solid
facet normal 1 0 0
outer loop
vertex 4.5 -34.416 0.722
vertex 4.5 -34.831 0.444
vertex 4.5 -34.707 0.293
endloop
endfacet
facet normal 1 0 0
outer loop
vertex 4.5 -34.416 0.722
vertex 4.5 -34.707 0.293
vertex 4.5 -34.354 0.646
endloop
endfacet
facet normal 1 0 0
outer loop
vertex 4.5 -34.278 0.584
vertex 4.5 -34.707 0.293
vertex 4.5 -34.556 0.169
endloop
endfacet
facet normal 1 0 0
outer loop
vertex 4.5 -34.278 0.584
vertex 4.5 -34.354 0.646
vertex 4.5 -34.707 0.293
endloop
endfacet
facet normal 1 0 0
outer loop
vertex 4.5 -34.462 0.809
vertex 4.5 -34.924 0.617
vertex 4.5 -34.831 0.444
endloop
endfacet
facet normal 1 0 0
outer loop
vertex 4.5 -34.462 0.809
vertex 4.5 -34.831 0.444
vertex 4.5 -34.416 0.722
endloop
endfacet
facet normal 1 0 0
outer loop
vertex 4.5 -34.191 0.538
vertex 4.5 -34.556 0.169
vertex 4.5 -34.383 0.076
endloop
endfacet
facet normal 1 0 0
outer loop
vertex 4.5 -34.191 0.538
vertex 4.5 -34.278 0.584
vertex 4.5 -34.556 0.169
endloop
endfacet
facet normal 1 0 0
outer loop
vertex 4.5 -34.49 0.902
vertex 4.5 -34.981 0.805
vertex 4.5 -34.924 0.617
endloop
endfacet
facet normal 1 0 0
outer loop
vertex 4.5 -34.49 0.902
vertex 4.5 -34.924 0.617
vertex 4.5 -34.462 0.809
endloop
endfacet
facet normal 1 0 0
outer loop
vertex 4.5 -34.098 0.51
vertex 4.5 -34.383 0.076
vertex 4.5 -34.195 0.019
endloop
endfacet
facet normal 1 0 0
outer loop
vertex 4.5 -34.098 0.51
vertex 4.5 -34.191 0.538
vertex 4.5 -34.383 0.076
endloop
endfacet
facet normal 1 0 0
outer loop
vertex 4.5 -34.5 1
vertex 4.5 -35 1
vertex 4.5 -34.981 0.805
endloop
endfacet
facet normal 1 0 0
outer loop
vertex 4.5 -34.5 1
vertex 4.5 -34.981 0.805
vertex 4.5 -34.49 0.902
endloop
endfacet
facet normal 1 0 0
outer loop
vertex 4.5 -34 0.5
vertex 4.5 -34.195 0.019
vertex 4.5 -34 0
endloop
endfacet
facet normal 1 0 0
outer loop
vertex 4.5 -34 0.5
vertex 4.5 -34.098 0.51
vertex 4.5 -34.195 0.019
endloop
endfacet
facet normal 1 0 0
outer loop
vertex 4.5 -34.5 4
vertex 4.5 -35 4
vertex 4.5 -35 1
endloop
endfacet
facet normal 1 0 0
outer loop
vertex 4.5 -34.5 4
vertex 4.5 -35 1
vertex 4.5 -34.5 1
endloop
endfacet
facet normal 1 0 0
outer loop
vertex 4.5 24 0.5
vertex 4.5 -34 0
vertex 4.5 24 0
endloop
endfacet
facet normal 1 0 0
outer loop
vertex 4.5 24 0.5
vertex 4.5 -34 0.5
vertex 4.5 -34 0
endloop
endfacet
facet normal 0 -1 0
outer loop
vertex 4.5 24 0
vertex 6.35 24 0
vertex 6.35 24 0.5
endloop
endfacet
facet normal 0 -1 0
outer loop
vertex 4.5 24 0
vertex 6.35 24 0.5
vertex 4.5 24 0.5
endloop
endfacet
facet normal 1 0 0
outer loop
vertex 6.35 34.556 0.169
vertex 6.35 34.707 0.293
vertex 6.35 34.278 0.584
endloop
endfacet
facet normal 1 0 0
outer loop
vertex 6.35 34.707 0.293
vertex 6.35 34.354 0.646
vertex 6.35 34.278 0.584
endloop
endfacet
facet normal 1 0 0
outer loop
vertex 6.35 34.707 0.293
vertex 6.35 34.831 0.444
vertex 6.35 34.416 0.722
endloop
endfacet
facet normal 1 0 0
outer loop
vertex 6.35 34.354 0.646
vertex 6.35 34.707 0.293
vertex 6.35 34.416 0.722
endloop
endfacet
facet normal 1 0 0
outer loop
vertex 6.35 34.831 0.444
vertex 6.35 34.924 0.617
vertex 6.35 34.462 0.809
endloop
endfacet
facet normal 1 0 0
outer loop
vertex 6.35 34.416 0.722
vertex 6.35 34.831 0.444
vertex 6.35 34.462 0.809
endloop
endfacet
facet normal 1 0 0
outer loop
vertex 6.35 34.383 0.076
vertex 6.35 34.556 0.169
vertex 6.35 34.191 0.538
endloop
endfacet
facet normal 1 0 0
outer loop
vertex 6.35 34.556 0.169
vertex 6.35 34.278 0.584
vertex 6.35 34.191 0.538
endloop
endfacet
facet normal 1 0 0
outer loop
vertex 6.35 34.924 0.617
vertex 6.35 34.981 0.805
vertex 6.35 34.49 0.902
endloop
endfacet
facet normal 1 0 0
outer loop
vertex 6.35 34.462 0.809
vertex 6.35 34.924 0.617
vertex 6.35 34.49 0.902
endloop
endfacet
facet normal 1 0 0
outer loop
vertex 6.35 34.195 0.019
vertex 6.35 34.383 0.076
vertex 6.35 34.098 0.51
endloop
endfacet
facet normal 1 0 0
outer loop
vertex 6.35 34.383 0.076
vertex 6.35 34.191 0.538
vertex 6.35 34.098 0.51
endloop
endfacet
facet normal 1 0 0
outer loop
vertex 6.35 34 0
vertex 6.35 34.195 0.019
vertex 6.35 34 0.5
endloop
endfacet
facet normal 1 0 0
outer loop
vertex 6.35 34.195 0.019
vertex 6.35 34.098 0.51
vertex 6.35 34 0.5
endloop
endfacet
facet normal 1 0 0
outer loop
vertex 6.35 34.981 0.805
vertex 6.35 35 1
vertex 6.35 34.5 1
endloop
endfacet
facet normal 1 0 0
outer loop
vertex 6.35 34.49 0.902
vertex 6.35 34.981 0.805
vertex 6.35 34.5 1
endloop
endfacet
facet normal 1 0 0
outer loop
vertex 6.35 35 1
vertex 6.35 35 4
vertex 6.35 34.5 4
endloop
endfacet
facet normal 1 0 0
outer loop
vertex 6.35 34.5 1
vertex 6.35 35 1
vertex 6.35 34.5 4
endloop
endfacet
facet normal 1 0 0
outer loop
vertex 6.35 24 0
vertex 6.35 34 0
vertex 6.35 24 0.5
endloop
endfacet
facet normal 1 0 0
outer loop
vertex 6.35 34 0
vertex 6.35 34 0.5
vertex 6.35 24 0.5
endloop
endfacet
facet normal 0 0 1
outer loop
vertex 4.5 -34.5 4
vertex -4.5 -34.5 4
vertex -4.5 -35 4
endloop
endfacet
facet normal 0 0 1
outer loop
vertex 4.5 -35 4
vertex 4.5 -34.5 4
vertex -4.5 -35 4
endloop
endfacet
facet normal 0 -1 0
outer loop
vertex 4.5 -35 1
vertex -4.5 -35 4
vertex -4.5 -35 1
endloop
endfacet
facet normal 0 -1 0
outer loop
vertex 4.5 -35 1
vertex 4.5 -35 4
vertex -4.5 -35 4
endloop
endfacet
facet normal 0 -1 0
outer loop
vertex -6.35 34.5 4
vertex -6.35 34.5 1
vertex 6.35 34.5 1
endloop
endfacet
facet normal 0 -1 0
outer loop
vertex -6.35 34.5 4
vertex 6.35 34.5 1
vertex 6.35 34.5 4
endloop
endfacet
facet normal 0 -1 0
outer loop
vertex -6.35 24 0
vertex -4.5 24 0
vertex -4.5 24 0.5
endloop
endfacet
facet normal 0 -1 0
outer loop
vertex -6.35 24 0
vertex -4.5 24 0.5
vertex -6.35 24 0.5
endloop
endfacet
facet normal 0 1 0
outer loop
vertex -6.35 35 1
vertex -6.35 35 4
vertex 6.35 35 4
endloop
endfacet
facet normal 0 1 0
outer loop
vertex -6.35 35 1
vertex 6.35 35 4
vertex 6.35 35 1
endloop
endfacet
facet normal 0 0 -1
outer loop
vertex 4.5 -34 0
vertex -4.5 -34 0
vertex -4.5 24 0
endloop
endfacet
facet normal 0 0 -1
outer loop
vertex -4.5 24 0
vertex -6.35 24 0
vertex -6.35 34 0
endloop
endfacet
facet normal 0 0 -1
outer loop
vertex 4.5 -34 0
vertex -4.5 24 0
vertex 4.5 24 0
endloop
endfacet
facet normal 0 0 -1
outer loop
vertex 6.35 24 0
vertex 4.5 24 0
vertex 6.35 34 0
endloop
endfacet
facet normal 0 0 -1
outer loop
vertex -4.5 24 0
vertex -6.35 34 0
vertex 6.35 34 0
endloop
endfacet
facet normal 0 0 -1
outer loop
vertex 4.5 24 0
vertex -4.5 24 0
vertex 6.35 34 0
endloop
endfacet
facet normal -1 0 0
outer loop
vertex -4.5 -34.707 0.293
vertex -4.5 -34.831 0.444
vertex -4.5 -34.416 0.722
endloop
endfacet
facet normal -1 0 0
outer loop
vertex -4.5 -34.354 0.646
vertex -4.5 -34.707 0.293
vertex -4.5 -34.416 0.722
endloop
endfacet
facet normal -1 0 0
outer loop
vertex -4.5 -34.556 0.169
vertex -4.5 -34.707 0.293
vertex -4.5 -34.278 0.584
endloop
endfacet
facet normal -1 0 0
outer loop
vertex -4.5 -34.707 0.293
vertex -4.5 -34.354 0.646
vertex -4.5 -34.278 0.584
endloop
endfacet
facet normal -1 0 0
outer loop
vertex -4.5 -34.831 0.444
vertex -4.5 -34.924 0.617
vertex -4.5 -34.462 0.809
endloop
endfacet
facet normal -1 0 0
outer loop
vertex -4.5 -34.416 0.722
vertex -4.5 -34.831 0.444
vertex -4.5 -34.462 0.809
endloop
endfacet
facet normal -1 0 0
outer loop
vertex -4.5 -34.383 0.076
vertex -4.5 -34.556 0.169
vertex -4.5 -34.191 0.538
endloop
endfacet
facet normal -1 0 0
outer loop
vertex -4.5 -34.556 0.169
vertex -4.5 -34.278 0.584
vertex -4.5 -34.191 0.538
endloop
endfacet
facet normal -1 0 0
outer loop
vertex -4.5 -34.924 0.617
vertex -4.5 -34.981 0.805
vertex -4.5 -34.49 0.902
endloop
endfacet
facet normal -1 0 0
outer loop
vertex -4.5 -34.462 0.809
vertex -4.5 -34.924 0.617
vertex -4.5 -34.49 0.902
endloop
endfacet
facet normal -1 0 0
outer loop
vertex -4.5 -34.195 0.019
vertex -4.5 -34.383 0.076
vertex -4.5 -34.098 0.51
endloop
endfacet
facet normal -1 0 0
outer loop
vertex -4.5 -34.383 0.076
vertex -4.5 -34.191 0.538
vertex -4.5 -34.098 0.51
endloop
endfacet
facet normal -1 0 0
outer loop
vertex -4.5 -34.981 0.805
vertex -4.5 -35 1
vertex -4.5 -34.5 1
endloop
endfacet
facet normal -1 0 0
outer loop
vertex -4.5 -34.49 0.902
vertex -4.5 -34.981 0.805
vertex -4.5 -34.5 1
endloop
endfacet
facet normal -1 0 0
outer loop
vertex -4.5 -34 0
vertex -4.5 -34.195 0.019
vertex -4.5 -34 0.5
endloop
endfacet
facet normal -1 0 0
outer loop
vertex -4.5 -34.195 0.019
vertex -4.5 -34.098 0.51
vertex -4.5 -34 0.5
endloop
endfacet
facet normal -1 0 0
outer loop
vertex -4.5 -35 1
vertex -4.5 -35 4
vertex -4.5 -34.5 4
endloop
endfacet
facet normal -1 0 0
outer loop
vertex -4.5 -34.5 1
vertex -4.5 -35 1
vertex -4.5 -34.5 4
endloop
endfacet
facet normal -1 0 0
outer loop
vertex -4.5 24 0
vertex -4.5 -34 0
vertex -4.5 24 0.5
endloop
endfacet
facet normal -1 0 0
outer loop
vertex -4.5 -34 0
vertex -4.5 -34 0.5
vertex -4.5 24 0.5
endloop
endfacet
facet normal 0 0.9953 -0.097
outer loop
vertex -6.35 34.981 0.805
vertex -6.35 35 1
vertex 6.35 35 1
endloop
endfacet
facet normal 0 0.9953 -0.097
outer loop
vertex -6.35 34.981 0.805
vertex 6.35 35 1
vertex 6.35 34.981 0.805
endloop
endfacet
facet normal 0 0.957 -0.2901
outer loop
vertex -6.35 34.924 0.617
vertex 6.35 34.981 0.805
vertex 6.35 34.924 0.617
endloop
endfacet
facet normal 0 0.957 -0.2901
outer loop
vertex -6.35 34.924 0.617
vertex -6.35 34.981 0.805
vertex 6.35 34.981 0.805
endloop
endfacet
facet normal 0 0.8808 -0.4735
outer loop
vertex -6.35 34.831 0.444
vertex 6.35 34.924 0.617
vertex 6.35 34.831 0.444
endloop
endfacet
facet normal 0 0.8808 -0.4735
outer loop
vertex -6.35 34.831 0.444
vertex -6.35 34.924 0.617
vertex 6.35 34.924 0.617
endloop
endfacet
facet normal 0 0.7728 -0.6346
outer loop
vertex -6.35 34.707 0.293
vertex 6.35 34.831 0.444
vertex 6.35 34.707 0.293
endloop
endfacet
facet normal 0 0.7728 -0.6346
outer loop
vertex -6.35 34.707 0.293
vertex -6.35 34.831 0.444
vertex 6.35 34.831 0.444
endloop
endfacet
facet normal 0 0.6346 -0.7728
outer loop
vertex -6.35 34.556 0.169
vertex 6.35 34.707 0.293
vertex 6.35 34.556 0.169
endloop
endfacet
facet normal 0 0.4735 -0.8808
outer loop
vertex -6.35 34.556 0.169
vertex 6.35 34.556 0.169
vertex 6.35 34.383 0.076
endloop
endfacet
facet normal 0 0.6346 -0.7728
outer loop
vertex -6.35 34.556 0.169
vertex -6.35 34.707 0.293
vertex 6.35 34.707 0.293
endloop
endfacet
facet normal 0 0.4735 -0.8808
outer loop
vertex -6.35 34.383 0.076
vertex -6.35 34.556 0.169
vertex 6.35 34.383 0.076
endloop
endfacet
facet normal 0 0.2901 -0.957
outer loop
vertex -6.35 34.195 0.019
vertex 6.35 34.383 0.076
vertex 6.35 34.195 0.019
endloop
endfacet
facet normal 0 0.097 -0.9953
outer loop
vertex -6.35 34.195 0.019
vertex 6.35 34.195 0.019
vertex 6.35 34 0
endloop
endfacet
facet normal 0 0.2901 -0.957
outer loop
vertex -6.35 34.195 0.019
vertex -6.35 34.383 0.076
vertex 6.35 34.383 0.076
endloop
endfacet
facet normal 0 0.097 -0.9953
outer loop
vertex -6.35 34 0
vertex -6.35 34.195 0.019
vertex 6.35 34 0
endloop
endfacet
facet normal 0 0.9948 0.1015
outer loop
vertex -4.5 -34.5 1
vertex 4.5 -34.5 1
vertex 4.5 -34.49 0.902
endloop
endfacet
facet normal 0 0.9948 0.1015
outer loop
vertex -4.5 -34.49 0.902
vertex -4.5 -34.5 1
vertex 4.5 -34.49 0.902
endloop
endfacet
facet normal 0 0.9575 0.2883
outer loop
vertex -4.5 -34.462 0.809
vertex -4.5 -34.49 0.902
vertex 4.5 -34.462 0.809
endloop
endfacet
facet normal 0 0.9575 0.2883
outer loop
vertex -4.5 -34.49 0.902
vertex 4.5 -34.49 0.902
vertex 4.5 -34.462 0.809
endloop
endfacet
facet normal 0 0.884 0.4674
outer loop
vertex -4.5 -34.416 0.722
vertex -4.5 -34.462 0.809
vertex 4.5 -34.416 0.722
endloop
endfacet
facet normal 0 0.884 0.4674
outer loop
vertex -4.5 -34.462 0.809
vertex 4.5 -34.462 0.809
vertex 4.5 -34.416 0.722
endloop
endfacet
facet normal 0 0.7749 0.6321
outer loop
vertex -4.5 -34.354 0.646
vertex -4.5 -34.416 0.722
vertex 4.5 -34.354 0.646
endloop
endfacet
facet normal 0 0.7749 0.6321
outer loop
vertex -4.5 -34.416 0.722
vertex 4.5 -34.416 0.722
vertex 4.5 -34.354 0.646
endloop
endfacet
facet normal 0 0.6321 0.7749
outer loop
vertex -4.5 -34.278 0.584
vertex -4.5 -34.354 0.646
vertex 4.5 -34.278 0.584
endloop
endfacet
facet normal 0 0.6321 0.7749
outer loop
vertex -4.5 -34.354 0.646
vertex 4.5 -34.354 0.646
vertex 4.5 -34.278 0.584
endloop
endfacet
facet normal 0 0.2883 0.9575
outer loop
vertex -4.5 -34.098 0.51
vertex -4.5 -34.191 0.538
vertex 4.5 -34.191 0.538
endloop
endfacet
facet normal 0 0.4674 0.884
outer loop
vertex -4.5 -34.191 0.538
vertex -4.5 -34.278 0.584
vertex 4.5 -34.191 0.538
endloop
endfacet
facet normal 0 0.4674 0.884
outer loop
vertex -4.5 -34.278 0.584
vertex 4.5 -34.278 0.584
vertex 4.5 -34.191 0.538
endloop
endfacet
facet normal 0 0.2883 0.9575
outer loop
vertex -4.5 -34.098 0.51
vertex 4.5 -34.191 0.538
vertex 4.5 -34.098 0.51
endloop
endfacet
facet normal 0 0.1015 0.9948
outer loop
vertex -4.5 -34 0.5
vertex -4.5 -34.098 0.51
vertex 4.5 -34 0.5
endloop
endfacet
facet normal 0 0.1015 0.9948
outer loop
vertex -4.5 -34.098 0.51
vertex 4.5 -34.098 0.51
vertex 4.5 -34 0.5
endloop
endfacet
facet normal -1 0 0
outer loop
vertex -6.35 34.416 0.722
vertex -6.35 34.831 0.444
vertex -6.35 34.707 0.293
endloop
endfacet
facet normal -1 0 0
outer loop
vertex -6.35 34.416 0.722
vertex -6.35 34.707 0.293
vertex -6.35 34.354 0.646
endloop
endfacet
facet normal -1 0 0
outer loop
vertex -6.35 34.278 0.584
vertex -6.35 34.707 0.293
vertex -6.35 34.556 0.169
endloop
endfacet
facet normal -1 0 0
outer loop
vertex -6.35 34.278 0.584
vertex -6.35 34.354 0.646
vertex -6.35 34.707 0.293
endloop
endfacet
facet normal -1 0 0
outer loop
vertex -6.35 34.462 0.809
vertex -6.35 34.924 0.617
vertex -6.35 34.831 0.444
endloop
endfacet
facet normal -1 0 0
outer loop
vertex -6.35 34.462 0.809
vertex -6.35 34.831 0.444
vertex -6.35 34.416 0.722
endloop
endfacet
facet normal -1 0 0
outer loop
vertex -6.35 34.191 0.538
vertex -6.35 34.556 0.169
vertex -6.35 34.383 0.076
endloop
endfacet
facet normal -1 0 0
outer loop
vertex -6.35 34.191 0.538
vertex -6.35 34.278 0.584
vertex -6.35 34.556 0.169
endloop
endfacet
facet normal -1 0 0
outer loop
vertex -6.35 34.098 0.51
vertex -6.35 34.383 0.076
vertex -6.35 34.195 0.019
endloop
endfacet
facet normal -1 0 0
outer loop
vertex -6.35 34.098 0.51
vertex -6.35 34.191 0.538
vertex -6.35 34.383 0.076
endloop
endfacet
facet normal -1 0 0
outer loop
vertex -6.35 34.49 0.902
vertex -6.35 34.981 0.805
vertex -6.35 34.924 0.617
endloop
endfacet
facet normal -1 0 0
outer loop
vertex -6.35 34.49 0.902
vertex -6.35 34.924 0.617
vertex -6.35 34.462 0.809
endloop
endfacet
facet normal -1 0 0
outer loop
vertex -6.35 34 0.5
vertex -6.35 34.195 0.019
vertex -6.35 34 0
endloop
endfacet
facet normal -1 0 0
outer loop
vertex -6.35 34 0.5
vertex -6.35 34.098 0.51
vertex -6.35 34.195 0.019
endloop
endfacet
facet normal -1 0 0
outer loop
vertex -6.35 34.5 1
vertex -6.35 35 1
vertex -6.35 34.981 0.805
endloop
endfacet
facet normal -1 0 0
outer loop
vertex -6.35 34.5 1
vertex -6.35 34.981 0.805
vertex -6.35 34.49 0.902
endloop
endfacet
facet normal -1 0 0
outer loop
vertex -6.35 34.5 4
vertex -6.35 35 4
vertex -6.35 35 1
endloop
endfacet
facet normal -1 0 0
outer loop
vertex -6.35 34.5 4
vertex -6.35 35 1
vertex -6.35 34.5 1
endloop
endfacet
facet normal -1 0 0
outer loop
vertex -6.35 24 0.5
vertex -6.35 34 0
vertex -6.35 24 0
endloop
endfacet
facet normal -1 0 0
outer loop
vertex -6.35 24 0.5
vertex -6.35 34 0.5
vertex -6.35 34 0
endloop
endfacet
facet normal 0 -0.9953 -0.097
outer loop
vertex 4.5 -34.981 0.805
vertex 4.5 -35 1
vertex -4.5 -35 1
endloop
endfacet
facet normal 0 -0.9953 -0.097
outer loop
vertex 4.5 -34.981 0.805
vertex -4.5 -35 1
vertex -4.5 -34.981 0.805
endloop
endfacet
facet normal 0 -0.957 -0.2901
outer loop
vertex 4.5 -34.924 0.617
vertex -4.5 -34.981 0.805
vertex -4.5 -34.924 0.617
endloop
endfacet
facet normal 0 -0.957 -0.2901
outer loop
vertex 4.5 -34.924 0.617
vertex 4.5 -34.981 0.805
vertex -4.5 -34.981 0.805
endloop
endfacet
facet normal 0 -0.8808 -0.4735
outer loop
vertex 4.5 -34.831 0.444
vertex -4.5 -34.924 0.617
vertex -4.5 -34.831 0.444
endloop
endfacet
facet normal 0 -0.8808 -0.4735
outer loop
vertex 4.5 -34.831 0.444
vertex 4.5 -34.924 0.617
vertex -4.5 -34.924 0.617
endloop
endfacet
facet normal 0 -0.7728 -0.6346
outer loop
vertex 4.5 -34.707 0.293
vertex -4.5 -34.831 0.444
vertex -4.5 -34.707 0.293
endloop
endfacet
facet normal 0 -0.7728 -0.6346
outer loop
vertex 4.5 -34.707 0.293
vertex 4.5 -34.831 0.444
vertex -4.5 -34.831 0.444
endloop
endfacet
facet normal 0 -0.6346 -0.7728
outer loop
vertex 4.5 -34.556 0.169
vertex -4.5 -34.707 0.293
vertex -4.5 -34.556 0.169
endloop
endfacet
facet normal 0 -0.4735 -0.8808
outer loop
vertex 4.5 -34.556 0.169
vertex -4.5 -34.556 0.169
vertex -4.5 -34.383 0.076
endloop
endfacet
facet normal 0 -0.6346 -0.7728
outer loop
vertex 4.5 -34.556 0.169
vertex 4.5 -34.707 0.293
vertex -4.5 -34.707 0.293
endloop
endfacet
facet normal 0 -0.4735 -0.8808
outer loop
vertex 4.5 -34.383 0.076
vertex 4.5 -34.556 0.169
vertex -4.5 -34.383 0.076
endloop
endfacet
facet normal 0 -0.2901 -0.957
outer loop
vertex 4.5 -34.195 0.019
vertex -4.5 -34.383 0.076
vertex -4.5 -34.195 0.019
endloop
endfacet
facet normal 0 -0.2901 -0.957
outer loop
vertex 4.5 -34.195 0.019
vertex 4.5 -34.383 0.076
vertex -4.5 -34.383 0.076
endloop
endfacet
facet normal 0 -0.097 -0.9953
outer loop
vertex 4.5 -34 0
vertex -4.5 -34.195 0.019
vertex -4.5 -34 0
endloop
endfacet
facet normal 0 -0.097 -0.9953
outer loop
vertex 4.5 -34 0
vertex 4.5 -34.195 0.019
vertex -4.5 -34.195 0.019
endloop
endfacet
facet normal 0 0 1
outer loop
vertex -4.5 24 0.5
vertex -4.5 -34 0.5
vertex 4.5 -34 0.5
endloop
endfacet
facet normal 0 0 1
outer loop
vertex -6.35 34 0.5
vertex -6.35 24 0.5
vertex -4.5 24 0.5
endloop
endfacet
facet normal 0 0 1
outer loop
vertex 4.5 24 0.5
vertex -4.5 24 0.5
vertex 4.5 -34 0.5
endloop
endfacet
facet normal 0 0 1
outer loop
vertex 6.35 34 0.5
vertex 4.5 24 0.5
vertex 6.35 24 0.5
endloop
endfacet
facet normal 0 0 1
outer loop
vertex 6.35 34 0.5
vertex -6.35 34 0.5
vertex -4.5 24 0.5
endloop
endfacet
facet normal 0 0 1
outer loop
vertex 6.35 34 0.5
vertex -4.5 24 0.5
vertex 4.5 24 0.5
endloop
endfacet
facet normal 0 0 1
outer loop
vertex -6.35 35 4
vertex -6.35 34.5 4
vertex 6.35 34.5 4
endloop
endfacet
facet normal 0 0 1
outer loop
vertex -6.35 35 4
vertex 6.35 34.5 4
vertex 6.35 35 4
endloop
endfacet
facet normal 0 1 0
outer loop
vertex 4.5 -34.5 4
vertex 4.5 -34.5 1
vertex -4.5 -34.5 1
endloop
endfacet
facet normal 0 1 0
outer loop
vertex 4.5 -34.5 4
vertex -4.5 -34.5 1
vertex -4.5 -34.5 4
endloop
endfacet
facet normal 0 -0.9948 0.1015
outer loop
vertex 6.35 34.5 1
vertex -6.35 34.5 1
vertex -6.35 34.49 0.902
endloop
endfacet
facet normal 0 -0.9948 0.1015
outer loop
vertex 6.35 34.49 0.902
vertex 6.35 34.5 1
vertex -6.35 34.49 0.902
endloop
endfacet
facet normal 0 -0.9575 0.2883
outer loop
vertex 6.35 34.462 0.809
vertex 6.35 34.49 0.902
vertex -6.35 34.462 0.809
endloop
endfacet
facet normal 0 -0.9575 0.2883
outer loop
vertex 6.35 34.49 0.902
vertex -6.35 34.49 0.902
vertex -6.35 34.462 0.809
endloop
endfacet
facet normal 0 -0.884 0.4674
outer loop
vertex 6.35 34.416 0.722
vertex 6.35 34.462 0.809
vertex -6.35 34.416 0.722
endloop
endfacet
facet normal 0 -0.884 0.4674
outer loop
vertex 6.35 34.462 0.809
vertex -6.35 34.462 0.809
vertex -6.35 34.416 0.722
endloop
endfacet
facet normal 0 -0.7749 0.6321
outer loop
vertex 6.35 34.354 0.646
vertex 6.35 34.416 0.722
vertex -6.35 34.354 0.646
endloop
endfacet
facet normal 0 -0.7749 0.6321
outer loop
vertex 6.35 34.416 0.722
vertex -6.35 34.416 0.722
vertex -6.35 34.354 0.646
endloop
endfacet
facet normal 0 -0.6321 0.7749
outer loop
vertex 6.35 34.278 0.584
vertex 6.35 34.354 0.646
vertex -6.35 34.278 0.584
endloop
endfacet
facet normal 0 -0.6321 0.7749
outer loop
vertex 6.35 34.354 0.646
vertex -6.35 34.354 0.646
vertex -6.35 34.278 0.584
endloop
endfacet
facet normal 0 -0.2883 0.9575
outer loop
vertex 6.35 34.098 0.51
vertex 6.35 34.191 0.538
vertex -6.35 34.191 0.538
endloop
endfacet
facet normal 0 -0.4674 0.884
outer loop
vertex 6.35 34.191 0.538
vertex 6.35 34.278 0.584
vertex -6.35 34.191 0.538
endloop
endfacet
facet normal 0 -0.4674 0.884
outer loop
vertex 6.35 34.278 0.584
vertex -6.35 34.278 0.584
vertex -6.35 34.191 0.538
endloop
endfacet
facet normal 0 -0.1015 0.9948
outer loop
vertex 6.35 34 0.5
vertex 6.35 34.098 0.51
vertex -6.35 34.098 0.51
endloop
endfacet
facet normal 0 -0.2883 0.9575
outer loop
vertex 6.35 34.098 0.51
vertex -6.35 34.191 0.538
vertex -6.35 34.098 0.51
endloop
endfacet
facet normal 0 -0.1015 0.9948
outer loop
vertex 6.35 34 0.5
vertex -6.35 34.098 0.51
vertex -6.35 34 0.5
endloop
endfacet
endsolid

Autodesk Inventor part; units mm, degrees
ref_plane "YZ Plane" through (0, 0, 0) normal (1, 0, 0) x (0, 1, 0)
ref_plane "XZ Plane" through (0, 0, 0) normal (0, 1, 0) x (-1, 0, 0)
ref_plane "XY Plane" through (0, 0, 0) normal (0, 0, 1) x (1, 0, 0)
sketch "Sketch1" plane through (0, 0, 0) normal (0, 0, 1) x (1, 0, 0)
  line L0 (0, 0) -> (6.3089, 0)
  line L1 (0, 0) -> (0, 8.1845)
  line L2 (4.5, 24) -> (4.5, -35)
  line L3 (4.5, -35) -> (-4.5, -35)
  line L4 (-4.5, -35) -> (-4.5, 24)
  line L5 (-6.35, 35) -> (6.35, 35)
  line L6 (6.35, 35) -> (6.35, 24)
  line L7 (-6.35, 24) -> (-6.35, 35)
  line L8 (6.35, 24) -> (4.5, 24)
  line L9 (-4.5, 24) -> (-6.35, 24)
  dimension "d4" = 9
  dimension "d5" = 12.7
  dimension "d6" = 70
  dimension "d7" = 11
extrude "Extrusion1" add sketch "Sketch1" along normal blind 0.5
sketch "Sketch2" plane through (-6.35, 34.5, 0) normal (0, 1, 0) x (-1, 0, 0)
  line L0 (-12.7, 0) -> (0, 0)
  line L1 (0, 0) -> (0, 4)
  line L2 (0, 4) -> (-12.7, 4)
  line L3 (-12.7, 4) -> (-12.7, 0)
edge flange "Flange1" height 4 angle 90 thickness 0.5 bend radius 0.5 thickness toward (0, 1, 0) relief straight relief width 0.5 relief depth 0.25 edges at (0, 35, 0.5) wall of the first edge with corners at (6.35, 34.5, 0) (-6.35, 34.5, 0) (-6.35, 34.5, 4) (6.35, 34.5, 4)
bend "Bend1"
corner "Corner1"
sketch "Sketch4" plane through (4.5, -34.5, 0) normal (0, -1, 0) x (1, 0, 0)
  line L0 (-9, 0) -> (0, 0)
  line L1 (0, 0) -> (0, 4)
  line L2 (0, 4) -> (-9, 4)
  line L3 (-9, 4) -> (-9, 0)
edge flange "Flange3" height 4 angle 90 thickness 0.5 bend radius 0.5 thickness toward (0, -1, 0) relief straight relief width 0.5 relief depth 0.25 edges at (0, -35, 0.5) wall of the first edge with corners at (-4.5, -34.5, 0) (4.5, -34.5, 0) (4.5, -34.5, 4) (-4.5, -34.5, 4)
bend "Bend3"
corner "Corner3"
equation "\"d8\" = BendReliefWidth"
equation "\"d9\" = BendReliefDepth"
equation "\"d10\" = MinimumRemnant"
equation "\"d11\" = BendRadius"
equation "\"d14\" = BendRadius"
equation "\"d15\" = CornerReliefSize"
equation "\"d16\" = GapSize"
equation "\"d17\" = JacobiRadiusSize"
equation "\"d28\" = BendReliefWidth"
equation "\"d29\" = BendReliefDepth"
equation "\"d30\" = MinimumRemnant"
equation "\"d31\" = BendRadius"
equation "\"d34\" = BendRadius"
equation "\"d35\" = CornerReliefSize"
equation "\"d36\" = GapSize"
equation "\"d37\" = JacobiRadiusSize"
equation "\"BendRadius\" = Thickness"
equation "\"BendReliefWidth\" = Thickness"
equation "\"BendReliefDepth\" = 0.5 * Thickness"
equation "\"CornerReliefSize\" = 4 * Thickness"
equation "\"MinimumRemnant\" = 2 * Thickness"
equation "\"TransitionRadius\" = BendRadius"
equation "\"JacobiRadiusSize\" = Thickness"
equation "\"GapSize\" = Thickness"
equation "\"Thickness\" = 0.5"
properties material "Aluminum-6061"
